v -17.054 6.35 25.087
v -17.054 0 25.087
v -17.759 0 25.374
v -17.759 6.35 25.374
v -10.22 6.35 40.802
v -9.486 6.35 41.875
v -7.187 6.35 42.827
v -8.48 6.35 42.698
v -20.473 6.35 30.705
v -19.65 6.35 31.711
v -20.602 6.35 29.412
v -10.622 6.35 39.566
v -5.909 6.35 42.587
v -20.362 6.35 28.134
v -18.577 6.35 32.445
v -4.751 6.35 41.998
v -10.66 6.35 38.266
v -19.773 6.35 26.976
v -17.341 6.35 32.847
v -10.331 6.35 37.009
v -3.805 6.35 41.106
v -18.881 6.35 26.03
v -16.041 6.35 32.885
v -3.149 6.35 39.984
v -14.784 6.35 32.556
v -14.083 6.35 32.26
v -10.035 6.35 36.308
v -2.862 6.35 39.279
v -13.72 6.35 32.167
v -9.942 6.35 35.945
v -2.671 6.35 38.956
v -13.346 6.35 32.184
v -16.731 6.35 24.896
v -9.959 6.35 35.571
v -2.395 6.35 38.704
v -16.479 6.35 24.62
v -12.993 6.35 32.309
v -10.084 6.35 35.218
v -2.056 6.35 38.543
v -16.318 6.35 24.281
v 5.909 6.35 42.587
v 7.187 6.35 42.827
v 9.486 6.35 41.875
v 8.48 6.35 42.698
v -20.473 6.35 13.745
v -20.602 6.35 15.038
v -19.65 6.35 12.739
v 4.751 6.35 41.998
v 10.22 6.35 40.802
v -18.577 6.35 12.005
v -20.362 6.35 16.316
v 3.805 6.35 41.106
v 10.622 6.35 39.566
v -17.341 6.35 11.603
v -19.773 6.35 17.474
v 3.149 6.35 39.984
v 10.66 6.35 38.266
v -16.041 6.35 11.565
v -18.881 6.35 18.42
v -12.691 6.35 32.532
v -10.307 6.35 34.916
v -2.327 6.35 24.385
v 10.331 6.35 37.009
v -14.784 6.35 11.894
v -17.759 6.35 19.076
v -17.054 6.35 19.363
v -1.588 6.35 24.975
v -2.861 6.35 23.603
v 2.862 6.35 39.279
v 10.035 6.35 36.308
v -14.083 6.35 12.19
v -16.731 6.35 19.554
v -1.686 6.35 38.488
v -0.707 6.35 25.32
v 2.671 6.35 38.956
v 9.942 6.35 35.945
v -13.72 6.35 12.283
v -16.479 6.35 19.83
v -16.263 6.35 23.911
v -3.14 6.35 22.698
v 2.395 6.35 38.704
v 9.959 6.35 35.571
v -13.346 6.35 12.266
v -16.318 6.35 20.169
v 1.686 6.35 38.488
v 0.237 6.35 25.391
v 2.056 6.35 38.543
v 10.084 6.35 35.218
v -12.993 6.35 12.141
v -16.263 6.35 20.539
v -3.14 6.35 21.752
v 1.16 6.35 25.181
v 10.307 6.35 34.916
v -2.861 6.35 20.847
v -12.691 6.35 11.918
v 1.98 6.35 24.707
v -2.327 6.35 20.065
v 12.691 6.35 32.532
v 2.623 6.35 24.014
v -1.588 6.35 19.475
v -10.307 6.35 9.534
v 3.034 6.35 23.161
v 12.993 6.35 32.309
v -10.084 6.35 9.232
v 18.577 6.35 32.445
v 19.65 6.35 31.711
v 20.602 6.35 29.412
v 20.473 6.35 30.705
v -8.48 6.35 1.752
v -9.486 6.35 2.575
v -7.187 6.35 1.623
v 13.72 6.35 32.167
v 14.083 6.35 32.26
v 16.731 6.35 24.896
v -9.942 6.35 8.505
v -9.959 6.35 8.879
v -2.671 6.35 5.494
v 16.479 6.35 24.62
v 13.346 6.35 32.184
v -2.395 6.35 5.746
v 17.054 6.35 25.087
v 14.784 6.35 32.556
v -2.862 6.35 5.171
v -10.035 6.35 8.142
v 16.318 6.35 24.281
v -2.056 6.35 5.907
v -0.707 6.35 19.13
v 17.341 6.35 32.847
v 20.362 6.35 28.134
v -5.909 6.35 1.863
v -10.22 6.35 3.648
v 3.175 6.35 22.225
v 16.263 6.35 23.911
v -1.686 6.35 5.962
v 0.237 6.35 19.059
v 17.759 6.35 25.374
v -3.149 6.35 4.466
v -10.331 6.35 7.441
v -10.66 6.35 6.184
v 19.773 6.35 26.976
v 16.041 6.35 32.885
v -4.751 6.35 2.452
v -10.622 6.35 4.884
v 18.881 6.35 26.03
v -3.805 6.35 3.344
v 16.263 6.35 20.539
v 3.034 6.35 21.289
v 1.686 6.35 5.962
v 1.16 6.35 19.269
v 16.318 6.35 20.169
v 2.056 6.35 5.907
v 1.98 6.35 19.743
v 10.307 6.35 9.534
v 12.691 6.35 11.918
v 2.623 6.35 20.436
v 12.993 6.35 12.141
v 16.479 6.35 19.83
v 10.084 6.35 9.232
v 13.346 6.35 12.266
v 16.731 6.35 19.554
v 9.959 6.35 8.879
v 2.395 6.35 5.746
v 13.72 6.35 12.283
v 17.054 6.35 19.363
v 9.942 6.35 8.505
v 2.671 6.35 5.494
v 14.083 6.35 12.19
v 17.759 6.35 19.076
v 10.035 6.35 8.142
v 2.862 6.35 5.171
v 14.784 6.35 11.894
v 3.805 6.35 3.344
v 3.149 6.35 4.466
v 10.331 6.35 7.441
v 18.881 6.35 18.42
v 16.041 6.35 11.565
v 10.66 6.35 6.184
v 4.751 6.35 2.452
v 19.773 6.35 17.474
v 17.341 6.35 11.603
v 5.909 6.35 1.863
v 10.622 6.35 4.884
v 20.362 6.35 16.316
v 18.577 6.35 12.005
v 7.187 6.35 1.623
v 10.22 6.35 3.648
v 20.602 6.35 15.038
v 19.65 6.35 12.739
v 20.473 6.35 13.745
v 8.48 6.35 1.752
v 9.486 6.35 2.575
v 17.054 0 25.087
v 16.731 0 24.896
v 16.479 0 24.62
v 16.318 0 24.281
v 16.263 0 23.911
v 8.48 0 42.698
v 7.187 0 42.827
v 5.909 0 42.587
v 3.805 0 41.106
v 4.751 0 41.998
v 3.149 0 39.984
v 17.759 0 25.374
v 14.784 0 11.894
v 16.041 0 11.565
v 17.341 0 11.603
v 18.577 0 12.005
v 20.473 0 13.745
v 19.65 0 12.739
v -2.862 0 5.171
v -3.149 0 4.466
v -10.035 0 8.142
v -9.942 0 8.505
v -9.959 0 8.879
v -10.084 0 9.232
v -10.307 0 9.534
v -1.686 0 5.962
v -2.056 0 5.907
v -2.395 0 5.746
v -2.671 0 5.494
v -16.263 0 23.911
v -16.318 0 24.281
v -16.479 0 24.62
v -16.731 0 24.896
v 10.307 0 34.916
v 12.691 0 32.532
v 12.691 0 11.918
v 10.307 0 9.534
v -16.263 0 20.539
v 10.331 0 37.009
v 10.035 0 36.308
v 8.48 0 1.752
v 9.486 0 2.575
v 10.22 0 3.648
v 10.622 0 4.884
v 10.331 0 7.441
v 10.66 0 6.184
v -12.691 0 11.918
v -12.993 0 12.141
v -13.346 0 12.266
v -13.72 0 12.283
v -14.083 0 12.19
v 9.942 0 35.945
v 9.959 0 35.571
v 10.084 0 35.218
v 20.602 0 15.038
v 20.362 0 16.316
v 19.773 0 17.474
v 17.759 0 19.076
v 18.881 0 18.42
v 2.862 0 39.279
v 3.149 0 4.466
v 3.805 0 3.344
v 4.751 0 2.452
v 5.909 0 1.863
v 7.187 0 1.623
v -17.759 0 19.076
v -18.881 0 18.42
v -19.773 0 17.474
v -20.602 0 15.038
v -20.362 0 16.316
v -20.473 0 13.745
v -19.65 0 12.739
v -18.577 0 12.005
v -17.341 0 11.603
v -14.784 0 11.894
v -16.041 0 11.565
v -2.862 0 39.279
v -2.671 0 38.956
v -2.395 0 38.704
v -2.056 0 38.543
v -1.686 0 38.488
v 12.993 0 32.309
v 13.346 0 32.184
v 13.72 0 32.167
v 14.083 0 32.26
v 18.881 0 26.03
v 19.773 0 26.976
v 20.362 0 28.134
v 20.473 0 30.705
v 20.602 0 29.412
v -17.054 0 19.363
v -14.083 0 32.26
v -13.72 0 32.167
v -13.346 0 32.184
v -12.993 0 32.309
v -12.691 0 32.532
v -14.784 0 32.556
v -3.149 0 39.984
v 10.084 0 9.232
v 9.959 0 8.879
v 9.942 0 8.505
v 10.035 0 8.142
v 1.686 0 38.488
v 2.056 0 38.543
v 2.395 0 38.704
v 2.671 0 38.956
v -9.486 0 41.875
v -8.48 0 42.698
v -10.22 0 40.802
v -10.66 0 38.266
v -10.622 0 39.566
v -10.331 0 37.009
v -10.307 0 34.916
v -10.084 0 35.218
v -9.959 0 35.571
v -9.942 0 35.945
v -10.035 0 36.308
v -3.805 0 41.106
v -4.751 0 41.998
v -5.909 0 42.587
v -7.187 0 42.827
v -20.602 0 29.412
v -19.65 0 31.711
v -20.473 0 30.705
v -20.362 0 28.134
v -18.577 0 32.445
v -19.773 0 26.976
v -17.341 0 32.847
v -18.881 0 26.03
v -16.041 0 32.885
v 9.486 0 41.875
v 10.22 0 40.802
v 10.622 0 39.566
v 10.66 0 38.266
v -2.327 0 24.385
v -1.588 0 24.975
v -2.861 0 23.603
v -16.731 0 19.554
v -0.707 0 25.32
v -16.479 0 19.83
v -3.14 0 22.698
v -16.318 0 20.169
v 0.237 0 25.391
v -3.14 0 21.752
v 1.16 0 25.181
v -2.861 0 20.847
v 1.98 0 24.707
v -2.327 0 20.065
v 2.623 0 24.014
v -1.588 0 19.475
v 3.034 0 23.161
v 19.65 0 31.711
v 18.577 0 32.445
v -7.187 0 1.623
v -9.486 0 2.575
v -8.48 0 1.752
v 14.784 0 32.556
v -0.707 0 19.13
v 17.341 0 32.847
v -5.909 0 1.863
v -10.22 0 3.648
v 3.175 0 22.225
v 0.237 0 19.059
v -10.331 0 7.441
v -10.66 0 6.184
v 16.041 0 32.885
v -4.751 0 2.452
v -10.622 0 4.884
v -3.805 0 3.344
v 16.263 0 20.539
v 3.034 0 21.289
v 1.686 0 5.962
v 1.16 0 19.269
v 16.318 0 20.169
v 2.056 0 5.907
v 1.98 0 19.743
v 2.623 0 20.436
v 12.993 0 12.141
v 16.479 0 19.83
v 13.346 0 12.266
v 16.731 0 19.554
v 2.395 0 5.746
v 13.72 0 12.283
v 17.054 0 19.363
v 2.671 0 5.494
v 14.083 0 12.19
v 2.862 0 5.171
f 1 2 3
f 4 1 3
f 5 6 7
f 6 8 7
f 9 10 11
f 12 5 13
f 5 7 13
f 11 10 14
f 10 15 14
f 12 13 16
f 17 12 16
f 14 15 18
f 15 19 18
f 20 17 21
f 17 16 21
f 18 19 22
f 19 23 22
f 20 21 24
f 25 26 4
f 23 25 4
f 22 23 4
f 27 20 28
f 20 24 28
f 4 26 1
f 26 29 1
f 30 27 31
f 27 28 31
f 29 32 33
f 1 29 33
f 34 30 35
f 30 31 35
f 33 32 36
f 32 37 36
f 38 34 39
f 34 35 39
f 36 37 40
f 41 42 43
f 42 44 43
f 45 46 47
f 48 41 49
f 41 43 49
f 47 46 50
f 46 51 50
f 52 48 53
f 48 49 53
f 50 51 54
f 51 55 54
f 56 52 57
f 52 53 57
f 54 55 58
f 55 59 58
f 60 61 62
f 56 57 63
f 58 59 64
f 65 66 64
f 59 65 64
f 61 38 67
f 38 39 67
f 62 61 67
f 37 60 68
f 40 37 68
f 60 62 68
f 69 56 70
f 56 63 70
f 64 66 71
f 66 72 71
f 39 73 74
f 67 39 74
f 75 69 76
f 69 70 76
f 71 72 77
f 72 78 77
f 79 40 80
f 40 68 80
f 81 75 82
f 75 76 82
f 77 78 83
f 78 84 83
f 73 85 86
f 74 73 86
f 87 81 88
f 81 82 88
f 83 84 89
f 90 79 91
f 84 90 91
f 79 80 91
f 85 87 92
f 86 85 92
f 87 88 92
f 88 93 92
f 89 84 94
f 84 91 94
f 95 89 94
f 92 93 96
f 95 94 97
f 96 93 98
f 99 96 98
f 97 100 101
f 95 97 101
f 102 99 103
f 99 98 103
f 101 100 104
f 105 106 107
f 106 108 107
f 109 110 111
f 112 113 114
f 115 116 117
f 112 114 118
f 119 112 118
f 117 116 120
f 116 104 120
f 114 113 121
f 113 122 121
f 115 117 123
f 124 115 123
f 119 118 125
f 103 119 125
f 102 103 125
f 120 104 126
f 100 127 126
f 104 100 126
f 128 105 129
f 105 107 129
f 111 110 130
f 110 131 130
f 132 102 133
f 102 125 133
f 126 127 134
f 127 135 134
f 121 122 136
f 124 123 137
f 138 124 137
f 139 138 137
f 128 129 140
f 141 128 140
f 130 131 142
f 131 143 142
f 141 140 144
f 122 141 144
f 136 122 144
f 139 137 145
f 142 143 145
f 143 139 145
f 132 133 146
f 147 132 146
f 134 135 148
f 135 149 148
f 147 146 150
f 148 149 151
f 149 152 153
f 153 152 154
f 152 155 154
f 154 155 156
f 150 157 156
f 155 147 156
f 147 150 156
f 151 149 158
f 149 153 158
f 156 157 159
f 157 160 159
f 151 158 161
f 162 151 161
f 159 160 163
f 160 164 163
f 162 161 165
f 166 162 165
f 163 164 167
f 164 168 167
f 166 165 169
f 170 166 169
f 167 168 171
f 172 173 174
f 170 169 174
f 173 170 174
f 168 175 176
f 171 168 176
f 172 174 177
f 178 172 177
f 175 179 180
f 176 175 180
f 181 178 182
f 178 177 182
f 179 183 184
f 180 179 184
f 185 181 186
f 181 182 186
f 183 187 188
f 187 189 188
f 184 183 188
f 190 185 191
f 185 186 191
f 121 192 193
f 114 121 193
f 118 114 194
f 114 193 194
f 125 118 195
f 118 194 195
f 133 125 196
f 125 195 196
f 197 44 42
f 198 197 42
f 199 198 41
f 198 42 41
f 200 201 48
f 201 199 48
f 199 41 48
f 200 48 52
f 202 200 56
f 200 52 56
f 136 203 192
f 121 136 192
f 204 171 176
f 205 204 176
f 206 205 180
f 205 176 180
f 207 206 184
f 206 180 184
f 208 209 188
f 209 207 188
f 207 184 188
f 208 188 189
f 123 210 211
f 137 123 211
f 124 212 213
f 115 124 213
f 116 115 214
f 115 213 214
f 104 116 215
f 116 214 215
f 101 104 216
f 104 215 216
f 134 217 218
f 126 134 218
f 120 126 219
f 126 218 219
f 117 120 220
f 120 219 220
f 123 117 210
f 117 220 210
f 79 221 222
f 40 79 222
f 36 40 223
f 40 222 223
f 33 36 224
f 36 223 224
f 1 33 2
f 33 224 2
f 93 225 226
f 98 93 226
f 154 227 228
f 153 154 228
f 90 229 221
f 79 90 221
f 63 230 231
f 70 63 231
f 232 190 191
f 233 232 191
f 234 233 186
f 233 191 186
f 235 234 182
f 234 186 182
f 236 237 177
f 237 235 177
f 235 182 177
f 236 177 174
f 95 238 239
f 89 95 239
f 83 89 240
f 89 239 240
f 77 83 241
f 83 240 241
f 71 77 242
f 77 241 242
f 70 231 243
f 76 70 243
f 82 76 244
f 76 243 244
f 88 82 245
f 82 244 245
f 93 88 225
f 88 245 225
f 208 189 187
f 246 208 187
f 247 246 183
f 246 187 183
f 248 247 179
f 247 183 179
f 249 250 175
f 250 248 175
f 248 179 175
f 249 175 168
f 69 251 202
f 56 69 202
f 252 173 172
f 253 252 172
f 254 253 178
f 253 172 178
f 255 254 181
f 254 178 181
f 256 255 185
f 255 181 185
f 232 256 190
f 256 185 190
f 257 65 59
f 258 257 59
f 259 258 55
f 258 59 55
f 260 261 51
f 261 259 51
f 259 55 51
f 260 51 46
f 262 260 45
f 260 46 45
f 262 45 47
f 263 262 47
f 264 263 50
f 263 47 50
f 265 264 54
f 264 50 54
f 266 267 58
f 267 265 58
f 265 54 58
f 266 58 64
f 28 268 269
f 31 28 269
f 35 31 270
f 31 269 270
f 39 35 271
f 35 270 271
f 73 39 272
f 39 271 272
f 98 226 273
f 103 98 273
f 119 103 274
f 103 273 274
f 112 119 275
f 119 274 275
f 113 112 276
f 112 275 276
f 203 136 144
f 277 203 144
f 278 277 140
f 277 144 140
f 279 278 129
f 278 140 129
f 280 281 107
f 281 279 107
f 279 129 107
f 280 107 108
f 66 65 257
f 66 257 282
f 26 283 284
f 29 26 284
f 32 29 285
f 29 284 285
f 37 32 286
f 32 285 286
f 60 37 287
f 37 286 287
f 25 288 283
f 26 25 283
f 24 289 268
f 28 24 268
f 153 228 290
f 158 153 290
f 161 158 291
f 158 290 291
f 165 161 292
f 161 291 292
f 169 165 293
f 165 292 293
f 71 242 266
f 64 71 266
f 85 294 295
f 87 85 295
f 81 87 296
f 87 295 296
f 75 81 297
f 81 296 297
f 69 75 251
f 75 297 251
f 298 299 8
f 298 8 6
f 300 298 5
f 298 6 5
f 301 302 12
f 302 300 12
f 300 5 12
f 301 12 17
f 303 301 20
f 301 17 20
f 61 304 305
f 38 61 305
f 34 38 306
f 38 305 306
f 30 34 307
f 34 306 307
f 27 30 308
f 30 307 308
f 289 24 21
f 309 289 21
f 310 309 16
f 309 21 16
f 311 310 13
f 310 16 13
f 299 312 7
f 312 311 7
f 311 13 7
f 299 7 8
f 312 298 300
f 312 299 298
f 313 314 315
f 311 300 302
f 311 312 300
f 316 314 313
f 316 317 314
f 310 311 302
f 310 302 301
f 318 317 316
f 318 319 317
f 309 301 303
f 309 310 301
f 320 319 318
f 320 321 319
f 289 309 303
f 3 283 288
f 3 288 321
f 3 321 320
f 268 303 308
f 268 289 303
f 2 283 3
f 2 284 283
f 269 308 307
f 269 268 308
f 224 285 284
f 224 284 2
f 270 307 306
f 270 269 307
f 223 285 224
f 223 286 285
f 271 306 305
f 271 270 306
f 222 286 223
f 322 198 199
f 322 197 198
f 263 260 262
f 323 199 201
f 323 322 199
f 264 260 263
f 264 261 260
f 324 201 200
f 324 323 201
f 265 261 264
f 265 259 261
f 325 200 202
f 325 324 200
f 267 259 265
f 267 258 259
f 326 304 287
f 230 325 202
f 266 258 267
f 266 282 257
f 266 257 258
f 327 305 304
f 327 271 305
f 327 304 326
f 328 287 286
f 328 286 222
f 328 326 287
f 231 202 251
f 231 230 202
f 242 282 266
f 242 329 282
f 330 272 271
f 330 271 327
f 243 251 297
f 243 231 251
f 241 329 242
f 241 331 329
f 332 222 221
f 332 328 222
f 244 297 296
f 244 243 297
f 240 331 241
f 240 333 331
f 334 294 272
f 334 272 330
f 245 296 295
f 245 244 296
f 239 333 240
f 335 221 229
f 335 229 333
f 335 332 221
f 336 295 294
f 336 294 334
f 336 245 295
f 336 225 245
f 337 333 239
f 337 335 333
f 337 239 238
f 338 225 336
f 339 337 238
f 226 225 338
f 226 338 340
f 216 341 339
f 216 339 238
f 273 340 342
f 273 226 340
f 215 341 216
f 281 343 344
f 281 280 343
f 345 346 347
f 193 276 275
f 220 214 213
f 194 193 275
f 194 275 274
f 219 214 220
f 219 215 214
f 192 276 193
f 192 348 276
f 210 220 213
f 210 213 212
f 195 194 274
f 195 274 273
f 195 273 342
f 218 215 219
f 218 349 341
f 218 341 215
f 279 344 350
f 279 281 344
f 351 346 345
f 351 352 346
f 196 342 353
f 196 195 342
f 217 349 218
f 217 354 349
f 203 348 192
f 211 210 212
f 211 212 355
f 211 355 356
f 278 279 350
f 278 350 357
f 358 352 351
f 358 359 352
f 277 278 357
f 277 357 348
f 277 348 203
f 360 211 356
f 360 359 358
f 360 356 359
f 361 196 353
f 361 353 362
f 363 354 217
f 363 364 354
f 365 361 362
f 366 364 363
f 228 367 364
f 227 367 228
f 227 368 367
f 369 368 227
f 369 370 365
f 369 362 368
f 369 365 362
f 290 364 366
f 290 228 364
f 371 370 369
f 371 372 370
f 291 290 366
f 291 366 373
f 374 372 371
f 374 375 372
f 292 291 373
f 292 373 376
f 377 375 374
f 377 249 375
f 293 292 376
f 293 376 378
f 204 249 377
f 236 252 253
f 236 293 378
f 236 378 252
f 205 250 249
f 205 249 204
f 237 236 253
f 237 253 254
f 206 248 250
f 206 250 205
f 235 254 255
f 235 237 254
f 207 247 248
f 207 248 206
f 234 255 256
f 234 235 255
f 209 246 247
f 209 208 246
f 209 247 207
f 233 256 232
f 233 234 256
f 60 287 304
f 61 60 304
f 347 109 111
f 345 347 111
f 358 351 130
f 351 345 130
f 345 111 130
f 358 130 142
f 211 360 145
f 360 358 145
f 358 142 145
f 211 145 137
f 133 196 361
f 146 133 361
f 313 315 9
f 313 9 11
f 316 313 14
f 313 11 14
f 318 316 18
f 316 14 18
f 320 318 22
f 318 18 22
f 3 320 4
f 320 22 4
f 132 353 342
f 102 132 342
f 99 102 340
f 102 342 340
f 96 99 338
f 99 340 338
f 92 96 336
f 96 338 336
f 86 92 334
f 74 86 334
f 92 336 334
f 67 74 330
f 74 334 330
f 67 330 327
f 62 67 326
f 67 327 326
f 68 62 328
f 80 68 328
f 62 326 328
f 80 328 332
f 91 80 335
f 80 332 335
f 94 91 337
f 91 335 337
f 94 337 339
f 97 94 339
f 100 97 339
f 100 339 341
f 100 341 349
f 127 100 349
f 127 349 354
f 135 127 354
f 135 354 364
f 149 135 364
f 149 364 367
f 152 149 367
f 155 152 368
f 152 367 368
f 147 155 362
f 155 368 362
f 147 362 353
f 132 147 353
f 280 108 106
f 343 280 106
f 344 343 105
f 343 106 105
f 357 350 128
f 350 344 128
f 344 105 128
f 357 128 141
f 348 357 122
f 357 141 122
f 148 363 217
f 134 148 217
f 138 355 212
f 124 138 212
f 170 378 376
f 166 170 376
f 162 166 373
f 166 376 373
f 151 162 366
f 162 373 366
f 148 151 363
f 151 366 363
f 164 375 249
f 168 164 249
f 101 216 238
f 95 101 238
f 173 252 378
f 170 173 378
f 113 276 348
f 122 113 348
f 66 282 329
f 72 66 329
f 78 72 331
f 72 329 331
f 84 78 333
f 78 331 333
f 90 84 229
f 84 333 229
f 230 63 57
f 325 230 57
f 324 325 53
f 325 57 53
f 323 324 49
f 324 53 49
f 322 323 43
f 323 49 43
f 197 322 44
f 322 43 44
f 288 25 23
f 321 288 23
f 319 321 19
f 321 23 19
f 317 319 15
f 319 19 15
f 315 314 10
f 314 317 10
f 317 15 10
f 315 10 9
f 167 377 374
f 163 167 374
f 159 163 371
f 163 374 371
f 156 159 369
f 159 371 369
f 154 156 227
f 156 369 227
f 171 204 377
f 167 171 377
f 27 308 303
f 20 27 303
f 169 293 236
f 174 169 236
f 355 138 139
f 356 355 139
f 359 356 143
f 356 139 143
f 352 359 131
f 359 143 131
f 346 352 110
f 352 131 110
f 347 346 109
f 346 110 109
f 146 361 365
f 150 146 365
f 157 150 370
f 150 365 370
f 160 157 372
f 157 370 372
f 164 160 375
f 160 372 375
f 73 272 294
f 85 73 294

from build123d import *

# Parameters (mm, degrees)
F0_W            = 6.35
F0_H            = 22.225
F3_DEPTH        = 6.35
F3_COPIES_COUNT = 8
F4_T1_DEPTH     = 30.2839966419
F4_T3_DEPTH     = 30.283996606
F5_R            = 3.175
F6_DEPTH        = 6.35


# Not quite as in the source:
# - a fillet or chamfer that OpenCascade refuses, or shapes differently, is made with other operations: its cross-section is extruded or revolved along the edge and cut away or added
# - a pattern or mirror of a feature is missing from the dataset's text; its kind, count and spacing are read off the source's solid


with BuildPart() as f1:
    # F0 (on Right) → F1 (revolve)
    with BuildSketch(Plane.YZ):
        with Locations((3.175, 33.3375)):
            Rectangle(F0_W, F0_H)
    revolve(axis=Axis((0, 3.175, 22.225), (0, 1, 0)))

    # F2 (on Front) → F3 (cut)
    with BuildSketch(Plane.XZ):
        with BuildLine():
            Line((-1.59e-08, 38.4876703219), (-1.59e-08, 44.3230155219))
            Line((-1.59e-08, 44.3230155219), (-1.59e-08, 44.457260554))
            Line((-1.59e-08, 44.457260554), (-4.9701853855, 44.457260554))
            Line((-4.9701853855, 44.457260554), (-4.9155350159, 44.3230155219))
            Line((-4.9155350159, 44.3230155219), (-2.8620721488, 39.2788192947))
            ThreePointArc((-2.8620721488, 39.2788192947), (-2.3945935663, 38.7038580036), (-1.6858061527, 38.4876703219))
            Line((-1.6858061527, 38.4876703219), (-1.59e-08, 38.4876703219))
        make_face()
        with BuildLine():
            Line((-1.59e-08, 44.457260554), (-1.59e-08, 44.3230155219))
            Line((-1.59e-08, 44.3230155219), (-1.59e-08, 38.4876703219))
            Line((-1.59e-08, 38.4876703219), (1.6858061209, 38.4876703219))
            ThreePointArc((1.6858061209, 38.4876703219), (2.3945935345, 38.7038580036), (2.8620721171, 39.2788192947))
            Line((2.8620721171, 39.2788192947), (4.9155349841, 44.3230155219))
            Line((4.9155349841, 44.3230155219), (4.9701853538, 44.457260554))
            Line((4.9701853538, 44.457260554), (-1.59e-08, 44.457260554))
        make_face()
    f3 = extrude(amount=-F3_DEPTH, mode=Mode.SUBTRACT)

    # F3_copies: F3 ×8 about axis
    f3_copies_axis = Axis((0, 0, 22.225), (0, 1, 0))
    for i in range(1, F3_COPIES_COUNT):
        add(f3.rotate(f3_copies_axis, i * 360 / F3_COPIES_COUNT), mode=Mode.SUBTRACT)

    # F4: fillet of radius 4.572 on 16 edges, made by hand

    # F4_s2 → F4_t1 (cut)
    with BuildSketch(Plane.XZ.offset(-18.3169983209)):
        with BuildLine():
            ThreePointArc((-3.1489730441, 39.9835724397), (-5.703273274, 42.5117575675), (-9.2958119446, 42.4125829482))
            ThreePointArc((-9.2958119446, 42.4125829482), (-7.0677616426, 43.2962451071), (-4.757507246, 43.934830718))
            Line((-4.757507246, 43.934830718), (-3.1489730441, 39.9835724397))
        make_face()
        with BuildLine():
            ThreePointArc((-10.330546803, 7.4411328104), (-10.3120806372, 3.8472729487), (-7.7016451357, 1.3770915389))
            ThreePointArc((-7.7016451357, 1.3770915389), (-9.901958118, 2.3277175114), (-11.9871028839, 3.5097658457))
            Line((-11.9871028839, 3.5097658457), (-10.330546803, 7.4411328104))
        make_face()
        with BuildLine():
            ThreePointArc((3.1489730441, 4.4664275603), (5.703273274, 1.9382424325), (9.2958119446, 2.0374170518))
            ThreePointArc((9.2958119446, 2.0374170518), (7.0677616426, 1.1537548929), (4.757507246, 0.515169282))
            Line((4.757507246, 0.515169282), (3.1489730441, 4.4664275603))
        make_face()
        with BuildLine():
            ThreePointArc((14.7838671896, 11.894453197), (18.3777270513, 11.9129193628), (20.8479084611, 14.5233548643))
            ThreePointArc((20.8479084611, 14.5233548643), (19.8972824886, 12.323041882), (18.7152341543, 10.2378971161))
            Line((18.7152341543, 10.2378971161), (14.7838671896, 11.894453197))
        make_face()
        with BuildLine():
            ThreePointArc((17.7585724397, 25.3739730441), (20.2867575675, 27.928273274), (20.1875829482, 31.5208119446))
            ThreePointArc((20.1875829482, 31.5208119446), (21.0712451071, 29.2927616426), (21.709830718, 26.982507246))
            Line((21.709830718, 26.982507246), (17.7585724397, 25.3739730441))
        make_face()
        with BuildLine():
            ThreePointArc((10.330546803, 37.0088671896), (10.3120806372, 40.6027270513), (7.7016451357, 43.0729084611))
            ThreePointArc((7.7016451357, 43.0729084611), (9.901958118, 42.1222824886), (11.9871028839, 40.9402341543))
            Line((11.9871028839, 40.9402341543), (10.330546803, 37.0088671896))
        make_face()
        with BuildLine():
            ThreePointArc((-14.7838671896, 32.555546803), (-18.3777270513, 32.5370806372), (-20.8479084611, 29.9266451357))
            ThreePointArc((-20.8479084611, 29.9266451357), (-19.8972824886, 32.126958118), (-18.7152341543, 34.2121028839))
            Line((-18.7152341543, 34.2121028839), (-14.7838671896, 32.555546803))
        make_face()
        with BuildLine():
            ThreePointArc((-17.7585724397, 19.0760269559), (-20.2867575675, 16.521726726), (-20.1875829482, 12.9291880554))
            ThreePointArc((-20.1875829482, 12.9291880554), (-21.0712451071, 15.1572383574), (-21.709830718, 17.467492754))
            Line((-21.709830718, 17.467492754), (-17.7585724397, 19.0760269559))
        make_face()
    extrude(amount=F4_T1_DEPTH, mode=Mode.SUBTRACT)

    # F4_s4 → F4_t3 (cut)
    with BuildSketch(Plane.XZ.offset(-18.316998303)):
        with BuildLine():
            ThreePointArc((9.295811911, 42.4125829637), (5.7032732438, 42.5117575784), (3.1489730174, 39.983572452))
            Line((3.1489730174, 39.983572452), (4.7575072169, 43.9348307244))
            ThreePointArc((4.7575072169, 43.9348307244), (7.0677616109, 43.2962451177), (9.295811911, 42.4125829637))
        make_face()
        with BuildLine():
            ThreePointArc((-9.295811911, 2.0374170363), (-5.7032732438, 1.9382424216), (-3.1489730174, 4.466427548))
            Line((-3.1489730174, 4.466427548), (-4.7575072169, 0.5151692756))
            ThreePointArc((-4.7575072169, 0.5151692756), (-7.0677616109, 1.1537548823), (-9.295811911, 2.0374170363))
        make_face()
        with BuildLine():
            ThreePointArc((7.7016451705, 1.3770915517), (10.3120806663, 3.8472729624), (10.3305468306, 7.4411328206))
            Line((10.3305468306, 7.4411328206), (11.987102909, 3.5097658618))
            ThreePointArc((11.987102909, 3.5097658618), (9.9019581479, 2.3277175263), (7.7016451705, 1.3770915517))
        make_face()
        with BuildLine():
            ThreePointArc((20.1875829637, 12.929188089), (20.2867575784, 16.5217267562), (17.758572452, 19.0760269826))
            Line((17.758572452, 19.0760269826), (21.7098307244, 17.4674927831))
            ThreePointArc((21.7098307244, 17.4674927831), (21.0712451177, 15.1572383891), (20.1875829637, 12.929188089))
        make_face()
        with BuildLine():
            ThreePointArc((20.8479084483, 29.9266451705), (18.3777270376, 32.5370806663), (14.7838671794, 32.5555468306))
            Line((14.7838671794, 32.5555468306), (18.7152341382, 34.212102909))
            ThreePointArc((18.7152341382, 34.212102909), (19.8972824737, 32.1269581479), (20.8479084483, 29.9266451705))
        make_face()
        with BuildLine():
            ThreePointArc((-7.7016451705, 43.0729084483), (-10.3120806663, 40.6027270376), (-10.3305468306, 37.0088671794))
            Line((-10.3305468306, 37.0088671794), (-11.987102909, 40.9402341382))
            ThreePointArc((-11.987102909, 40.9402341382), (-9.9019581479, 42.1222824737), (-7.7016451705, 43.0729084483))
        make_face()
        with BuildLine():
            ThreePointArc((-20.1875829637, 31.520811911), (-20.2867575784, 27.9282732438), (-17.758572452, 25.3739730174))
            Line((-17.758572452, 25.3739730174), (-21.7098307244, 26.9825072169))
            ThreePointArc((-21.7098307244, 26.9825072169), (-21.0712451177, 29.2927616109), (-20.1875829637, 31.520811911))
        make_face()
        with BuildLine():
            ThreePointArc((-20.8479084483, 14.5233548295), (-18.3777270376, 11.9129193337), (-14.7838671794, 11.8944531694))
            Line((-14.7838671794, 11.8944531694), (-18.7152341382, 10.237897091))
            ThreePointArc((-18.7152341382, 10.237897091), (-19.8972824737, 12.3230418521), (-20.8479084483, 14.5233548295))
        make_face()
    extrude(amount=F4_T3_DEPTH, mode=Mode.SUBTRACT)

    # F5 (on Front) → F6 (cut)
    with BuildSketch(Plane.XZ):
        with Locations((0, 22.225)):
            Circle(F5_R)
    extrude(amount=-F6_DEPTH, mode=Mode.SUBTRACT)


solid = f1.part
